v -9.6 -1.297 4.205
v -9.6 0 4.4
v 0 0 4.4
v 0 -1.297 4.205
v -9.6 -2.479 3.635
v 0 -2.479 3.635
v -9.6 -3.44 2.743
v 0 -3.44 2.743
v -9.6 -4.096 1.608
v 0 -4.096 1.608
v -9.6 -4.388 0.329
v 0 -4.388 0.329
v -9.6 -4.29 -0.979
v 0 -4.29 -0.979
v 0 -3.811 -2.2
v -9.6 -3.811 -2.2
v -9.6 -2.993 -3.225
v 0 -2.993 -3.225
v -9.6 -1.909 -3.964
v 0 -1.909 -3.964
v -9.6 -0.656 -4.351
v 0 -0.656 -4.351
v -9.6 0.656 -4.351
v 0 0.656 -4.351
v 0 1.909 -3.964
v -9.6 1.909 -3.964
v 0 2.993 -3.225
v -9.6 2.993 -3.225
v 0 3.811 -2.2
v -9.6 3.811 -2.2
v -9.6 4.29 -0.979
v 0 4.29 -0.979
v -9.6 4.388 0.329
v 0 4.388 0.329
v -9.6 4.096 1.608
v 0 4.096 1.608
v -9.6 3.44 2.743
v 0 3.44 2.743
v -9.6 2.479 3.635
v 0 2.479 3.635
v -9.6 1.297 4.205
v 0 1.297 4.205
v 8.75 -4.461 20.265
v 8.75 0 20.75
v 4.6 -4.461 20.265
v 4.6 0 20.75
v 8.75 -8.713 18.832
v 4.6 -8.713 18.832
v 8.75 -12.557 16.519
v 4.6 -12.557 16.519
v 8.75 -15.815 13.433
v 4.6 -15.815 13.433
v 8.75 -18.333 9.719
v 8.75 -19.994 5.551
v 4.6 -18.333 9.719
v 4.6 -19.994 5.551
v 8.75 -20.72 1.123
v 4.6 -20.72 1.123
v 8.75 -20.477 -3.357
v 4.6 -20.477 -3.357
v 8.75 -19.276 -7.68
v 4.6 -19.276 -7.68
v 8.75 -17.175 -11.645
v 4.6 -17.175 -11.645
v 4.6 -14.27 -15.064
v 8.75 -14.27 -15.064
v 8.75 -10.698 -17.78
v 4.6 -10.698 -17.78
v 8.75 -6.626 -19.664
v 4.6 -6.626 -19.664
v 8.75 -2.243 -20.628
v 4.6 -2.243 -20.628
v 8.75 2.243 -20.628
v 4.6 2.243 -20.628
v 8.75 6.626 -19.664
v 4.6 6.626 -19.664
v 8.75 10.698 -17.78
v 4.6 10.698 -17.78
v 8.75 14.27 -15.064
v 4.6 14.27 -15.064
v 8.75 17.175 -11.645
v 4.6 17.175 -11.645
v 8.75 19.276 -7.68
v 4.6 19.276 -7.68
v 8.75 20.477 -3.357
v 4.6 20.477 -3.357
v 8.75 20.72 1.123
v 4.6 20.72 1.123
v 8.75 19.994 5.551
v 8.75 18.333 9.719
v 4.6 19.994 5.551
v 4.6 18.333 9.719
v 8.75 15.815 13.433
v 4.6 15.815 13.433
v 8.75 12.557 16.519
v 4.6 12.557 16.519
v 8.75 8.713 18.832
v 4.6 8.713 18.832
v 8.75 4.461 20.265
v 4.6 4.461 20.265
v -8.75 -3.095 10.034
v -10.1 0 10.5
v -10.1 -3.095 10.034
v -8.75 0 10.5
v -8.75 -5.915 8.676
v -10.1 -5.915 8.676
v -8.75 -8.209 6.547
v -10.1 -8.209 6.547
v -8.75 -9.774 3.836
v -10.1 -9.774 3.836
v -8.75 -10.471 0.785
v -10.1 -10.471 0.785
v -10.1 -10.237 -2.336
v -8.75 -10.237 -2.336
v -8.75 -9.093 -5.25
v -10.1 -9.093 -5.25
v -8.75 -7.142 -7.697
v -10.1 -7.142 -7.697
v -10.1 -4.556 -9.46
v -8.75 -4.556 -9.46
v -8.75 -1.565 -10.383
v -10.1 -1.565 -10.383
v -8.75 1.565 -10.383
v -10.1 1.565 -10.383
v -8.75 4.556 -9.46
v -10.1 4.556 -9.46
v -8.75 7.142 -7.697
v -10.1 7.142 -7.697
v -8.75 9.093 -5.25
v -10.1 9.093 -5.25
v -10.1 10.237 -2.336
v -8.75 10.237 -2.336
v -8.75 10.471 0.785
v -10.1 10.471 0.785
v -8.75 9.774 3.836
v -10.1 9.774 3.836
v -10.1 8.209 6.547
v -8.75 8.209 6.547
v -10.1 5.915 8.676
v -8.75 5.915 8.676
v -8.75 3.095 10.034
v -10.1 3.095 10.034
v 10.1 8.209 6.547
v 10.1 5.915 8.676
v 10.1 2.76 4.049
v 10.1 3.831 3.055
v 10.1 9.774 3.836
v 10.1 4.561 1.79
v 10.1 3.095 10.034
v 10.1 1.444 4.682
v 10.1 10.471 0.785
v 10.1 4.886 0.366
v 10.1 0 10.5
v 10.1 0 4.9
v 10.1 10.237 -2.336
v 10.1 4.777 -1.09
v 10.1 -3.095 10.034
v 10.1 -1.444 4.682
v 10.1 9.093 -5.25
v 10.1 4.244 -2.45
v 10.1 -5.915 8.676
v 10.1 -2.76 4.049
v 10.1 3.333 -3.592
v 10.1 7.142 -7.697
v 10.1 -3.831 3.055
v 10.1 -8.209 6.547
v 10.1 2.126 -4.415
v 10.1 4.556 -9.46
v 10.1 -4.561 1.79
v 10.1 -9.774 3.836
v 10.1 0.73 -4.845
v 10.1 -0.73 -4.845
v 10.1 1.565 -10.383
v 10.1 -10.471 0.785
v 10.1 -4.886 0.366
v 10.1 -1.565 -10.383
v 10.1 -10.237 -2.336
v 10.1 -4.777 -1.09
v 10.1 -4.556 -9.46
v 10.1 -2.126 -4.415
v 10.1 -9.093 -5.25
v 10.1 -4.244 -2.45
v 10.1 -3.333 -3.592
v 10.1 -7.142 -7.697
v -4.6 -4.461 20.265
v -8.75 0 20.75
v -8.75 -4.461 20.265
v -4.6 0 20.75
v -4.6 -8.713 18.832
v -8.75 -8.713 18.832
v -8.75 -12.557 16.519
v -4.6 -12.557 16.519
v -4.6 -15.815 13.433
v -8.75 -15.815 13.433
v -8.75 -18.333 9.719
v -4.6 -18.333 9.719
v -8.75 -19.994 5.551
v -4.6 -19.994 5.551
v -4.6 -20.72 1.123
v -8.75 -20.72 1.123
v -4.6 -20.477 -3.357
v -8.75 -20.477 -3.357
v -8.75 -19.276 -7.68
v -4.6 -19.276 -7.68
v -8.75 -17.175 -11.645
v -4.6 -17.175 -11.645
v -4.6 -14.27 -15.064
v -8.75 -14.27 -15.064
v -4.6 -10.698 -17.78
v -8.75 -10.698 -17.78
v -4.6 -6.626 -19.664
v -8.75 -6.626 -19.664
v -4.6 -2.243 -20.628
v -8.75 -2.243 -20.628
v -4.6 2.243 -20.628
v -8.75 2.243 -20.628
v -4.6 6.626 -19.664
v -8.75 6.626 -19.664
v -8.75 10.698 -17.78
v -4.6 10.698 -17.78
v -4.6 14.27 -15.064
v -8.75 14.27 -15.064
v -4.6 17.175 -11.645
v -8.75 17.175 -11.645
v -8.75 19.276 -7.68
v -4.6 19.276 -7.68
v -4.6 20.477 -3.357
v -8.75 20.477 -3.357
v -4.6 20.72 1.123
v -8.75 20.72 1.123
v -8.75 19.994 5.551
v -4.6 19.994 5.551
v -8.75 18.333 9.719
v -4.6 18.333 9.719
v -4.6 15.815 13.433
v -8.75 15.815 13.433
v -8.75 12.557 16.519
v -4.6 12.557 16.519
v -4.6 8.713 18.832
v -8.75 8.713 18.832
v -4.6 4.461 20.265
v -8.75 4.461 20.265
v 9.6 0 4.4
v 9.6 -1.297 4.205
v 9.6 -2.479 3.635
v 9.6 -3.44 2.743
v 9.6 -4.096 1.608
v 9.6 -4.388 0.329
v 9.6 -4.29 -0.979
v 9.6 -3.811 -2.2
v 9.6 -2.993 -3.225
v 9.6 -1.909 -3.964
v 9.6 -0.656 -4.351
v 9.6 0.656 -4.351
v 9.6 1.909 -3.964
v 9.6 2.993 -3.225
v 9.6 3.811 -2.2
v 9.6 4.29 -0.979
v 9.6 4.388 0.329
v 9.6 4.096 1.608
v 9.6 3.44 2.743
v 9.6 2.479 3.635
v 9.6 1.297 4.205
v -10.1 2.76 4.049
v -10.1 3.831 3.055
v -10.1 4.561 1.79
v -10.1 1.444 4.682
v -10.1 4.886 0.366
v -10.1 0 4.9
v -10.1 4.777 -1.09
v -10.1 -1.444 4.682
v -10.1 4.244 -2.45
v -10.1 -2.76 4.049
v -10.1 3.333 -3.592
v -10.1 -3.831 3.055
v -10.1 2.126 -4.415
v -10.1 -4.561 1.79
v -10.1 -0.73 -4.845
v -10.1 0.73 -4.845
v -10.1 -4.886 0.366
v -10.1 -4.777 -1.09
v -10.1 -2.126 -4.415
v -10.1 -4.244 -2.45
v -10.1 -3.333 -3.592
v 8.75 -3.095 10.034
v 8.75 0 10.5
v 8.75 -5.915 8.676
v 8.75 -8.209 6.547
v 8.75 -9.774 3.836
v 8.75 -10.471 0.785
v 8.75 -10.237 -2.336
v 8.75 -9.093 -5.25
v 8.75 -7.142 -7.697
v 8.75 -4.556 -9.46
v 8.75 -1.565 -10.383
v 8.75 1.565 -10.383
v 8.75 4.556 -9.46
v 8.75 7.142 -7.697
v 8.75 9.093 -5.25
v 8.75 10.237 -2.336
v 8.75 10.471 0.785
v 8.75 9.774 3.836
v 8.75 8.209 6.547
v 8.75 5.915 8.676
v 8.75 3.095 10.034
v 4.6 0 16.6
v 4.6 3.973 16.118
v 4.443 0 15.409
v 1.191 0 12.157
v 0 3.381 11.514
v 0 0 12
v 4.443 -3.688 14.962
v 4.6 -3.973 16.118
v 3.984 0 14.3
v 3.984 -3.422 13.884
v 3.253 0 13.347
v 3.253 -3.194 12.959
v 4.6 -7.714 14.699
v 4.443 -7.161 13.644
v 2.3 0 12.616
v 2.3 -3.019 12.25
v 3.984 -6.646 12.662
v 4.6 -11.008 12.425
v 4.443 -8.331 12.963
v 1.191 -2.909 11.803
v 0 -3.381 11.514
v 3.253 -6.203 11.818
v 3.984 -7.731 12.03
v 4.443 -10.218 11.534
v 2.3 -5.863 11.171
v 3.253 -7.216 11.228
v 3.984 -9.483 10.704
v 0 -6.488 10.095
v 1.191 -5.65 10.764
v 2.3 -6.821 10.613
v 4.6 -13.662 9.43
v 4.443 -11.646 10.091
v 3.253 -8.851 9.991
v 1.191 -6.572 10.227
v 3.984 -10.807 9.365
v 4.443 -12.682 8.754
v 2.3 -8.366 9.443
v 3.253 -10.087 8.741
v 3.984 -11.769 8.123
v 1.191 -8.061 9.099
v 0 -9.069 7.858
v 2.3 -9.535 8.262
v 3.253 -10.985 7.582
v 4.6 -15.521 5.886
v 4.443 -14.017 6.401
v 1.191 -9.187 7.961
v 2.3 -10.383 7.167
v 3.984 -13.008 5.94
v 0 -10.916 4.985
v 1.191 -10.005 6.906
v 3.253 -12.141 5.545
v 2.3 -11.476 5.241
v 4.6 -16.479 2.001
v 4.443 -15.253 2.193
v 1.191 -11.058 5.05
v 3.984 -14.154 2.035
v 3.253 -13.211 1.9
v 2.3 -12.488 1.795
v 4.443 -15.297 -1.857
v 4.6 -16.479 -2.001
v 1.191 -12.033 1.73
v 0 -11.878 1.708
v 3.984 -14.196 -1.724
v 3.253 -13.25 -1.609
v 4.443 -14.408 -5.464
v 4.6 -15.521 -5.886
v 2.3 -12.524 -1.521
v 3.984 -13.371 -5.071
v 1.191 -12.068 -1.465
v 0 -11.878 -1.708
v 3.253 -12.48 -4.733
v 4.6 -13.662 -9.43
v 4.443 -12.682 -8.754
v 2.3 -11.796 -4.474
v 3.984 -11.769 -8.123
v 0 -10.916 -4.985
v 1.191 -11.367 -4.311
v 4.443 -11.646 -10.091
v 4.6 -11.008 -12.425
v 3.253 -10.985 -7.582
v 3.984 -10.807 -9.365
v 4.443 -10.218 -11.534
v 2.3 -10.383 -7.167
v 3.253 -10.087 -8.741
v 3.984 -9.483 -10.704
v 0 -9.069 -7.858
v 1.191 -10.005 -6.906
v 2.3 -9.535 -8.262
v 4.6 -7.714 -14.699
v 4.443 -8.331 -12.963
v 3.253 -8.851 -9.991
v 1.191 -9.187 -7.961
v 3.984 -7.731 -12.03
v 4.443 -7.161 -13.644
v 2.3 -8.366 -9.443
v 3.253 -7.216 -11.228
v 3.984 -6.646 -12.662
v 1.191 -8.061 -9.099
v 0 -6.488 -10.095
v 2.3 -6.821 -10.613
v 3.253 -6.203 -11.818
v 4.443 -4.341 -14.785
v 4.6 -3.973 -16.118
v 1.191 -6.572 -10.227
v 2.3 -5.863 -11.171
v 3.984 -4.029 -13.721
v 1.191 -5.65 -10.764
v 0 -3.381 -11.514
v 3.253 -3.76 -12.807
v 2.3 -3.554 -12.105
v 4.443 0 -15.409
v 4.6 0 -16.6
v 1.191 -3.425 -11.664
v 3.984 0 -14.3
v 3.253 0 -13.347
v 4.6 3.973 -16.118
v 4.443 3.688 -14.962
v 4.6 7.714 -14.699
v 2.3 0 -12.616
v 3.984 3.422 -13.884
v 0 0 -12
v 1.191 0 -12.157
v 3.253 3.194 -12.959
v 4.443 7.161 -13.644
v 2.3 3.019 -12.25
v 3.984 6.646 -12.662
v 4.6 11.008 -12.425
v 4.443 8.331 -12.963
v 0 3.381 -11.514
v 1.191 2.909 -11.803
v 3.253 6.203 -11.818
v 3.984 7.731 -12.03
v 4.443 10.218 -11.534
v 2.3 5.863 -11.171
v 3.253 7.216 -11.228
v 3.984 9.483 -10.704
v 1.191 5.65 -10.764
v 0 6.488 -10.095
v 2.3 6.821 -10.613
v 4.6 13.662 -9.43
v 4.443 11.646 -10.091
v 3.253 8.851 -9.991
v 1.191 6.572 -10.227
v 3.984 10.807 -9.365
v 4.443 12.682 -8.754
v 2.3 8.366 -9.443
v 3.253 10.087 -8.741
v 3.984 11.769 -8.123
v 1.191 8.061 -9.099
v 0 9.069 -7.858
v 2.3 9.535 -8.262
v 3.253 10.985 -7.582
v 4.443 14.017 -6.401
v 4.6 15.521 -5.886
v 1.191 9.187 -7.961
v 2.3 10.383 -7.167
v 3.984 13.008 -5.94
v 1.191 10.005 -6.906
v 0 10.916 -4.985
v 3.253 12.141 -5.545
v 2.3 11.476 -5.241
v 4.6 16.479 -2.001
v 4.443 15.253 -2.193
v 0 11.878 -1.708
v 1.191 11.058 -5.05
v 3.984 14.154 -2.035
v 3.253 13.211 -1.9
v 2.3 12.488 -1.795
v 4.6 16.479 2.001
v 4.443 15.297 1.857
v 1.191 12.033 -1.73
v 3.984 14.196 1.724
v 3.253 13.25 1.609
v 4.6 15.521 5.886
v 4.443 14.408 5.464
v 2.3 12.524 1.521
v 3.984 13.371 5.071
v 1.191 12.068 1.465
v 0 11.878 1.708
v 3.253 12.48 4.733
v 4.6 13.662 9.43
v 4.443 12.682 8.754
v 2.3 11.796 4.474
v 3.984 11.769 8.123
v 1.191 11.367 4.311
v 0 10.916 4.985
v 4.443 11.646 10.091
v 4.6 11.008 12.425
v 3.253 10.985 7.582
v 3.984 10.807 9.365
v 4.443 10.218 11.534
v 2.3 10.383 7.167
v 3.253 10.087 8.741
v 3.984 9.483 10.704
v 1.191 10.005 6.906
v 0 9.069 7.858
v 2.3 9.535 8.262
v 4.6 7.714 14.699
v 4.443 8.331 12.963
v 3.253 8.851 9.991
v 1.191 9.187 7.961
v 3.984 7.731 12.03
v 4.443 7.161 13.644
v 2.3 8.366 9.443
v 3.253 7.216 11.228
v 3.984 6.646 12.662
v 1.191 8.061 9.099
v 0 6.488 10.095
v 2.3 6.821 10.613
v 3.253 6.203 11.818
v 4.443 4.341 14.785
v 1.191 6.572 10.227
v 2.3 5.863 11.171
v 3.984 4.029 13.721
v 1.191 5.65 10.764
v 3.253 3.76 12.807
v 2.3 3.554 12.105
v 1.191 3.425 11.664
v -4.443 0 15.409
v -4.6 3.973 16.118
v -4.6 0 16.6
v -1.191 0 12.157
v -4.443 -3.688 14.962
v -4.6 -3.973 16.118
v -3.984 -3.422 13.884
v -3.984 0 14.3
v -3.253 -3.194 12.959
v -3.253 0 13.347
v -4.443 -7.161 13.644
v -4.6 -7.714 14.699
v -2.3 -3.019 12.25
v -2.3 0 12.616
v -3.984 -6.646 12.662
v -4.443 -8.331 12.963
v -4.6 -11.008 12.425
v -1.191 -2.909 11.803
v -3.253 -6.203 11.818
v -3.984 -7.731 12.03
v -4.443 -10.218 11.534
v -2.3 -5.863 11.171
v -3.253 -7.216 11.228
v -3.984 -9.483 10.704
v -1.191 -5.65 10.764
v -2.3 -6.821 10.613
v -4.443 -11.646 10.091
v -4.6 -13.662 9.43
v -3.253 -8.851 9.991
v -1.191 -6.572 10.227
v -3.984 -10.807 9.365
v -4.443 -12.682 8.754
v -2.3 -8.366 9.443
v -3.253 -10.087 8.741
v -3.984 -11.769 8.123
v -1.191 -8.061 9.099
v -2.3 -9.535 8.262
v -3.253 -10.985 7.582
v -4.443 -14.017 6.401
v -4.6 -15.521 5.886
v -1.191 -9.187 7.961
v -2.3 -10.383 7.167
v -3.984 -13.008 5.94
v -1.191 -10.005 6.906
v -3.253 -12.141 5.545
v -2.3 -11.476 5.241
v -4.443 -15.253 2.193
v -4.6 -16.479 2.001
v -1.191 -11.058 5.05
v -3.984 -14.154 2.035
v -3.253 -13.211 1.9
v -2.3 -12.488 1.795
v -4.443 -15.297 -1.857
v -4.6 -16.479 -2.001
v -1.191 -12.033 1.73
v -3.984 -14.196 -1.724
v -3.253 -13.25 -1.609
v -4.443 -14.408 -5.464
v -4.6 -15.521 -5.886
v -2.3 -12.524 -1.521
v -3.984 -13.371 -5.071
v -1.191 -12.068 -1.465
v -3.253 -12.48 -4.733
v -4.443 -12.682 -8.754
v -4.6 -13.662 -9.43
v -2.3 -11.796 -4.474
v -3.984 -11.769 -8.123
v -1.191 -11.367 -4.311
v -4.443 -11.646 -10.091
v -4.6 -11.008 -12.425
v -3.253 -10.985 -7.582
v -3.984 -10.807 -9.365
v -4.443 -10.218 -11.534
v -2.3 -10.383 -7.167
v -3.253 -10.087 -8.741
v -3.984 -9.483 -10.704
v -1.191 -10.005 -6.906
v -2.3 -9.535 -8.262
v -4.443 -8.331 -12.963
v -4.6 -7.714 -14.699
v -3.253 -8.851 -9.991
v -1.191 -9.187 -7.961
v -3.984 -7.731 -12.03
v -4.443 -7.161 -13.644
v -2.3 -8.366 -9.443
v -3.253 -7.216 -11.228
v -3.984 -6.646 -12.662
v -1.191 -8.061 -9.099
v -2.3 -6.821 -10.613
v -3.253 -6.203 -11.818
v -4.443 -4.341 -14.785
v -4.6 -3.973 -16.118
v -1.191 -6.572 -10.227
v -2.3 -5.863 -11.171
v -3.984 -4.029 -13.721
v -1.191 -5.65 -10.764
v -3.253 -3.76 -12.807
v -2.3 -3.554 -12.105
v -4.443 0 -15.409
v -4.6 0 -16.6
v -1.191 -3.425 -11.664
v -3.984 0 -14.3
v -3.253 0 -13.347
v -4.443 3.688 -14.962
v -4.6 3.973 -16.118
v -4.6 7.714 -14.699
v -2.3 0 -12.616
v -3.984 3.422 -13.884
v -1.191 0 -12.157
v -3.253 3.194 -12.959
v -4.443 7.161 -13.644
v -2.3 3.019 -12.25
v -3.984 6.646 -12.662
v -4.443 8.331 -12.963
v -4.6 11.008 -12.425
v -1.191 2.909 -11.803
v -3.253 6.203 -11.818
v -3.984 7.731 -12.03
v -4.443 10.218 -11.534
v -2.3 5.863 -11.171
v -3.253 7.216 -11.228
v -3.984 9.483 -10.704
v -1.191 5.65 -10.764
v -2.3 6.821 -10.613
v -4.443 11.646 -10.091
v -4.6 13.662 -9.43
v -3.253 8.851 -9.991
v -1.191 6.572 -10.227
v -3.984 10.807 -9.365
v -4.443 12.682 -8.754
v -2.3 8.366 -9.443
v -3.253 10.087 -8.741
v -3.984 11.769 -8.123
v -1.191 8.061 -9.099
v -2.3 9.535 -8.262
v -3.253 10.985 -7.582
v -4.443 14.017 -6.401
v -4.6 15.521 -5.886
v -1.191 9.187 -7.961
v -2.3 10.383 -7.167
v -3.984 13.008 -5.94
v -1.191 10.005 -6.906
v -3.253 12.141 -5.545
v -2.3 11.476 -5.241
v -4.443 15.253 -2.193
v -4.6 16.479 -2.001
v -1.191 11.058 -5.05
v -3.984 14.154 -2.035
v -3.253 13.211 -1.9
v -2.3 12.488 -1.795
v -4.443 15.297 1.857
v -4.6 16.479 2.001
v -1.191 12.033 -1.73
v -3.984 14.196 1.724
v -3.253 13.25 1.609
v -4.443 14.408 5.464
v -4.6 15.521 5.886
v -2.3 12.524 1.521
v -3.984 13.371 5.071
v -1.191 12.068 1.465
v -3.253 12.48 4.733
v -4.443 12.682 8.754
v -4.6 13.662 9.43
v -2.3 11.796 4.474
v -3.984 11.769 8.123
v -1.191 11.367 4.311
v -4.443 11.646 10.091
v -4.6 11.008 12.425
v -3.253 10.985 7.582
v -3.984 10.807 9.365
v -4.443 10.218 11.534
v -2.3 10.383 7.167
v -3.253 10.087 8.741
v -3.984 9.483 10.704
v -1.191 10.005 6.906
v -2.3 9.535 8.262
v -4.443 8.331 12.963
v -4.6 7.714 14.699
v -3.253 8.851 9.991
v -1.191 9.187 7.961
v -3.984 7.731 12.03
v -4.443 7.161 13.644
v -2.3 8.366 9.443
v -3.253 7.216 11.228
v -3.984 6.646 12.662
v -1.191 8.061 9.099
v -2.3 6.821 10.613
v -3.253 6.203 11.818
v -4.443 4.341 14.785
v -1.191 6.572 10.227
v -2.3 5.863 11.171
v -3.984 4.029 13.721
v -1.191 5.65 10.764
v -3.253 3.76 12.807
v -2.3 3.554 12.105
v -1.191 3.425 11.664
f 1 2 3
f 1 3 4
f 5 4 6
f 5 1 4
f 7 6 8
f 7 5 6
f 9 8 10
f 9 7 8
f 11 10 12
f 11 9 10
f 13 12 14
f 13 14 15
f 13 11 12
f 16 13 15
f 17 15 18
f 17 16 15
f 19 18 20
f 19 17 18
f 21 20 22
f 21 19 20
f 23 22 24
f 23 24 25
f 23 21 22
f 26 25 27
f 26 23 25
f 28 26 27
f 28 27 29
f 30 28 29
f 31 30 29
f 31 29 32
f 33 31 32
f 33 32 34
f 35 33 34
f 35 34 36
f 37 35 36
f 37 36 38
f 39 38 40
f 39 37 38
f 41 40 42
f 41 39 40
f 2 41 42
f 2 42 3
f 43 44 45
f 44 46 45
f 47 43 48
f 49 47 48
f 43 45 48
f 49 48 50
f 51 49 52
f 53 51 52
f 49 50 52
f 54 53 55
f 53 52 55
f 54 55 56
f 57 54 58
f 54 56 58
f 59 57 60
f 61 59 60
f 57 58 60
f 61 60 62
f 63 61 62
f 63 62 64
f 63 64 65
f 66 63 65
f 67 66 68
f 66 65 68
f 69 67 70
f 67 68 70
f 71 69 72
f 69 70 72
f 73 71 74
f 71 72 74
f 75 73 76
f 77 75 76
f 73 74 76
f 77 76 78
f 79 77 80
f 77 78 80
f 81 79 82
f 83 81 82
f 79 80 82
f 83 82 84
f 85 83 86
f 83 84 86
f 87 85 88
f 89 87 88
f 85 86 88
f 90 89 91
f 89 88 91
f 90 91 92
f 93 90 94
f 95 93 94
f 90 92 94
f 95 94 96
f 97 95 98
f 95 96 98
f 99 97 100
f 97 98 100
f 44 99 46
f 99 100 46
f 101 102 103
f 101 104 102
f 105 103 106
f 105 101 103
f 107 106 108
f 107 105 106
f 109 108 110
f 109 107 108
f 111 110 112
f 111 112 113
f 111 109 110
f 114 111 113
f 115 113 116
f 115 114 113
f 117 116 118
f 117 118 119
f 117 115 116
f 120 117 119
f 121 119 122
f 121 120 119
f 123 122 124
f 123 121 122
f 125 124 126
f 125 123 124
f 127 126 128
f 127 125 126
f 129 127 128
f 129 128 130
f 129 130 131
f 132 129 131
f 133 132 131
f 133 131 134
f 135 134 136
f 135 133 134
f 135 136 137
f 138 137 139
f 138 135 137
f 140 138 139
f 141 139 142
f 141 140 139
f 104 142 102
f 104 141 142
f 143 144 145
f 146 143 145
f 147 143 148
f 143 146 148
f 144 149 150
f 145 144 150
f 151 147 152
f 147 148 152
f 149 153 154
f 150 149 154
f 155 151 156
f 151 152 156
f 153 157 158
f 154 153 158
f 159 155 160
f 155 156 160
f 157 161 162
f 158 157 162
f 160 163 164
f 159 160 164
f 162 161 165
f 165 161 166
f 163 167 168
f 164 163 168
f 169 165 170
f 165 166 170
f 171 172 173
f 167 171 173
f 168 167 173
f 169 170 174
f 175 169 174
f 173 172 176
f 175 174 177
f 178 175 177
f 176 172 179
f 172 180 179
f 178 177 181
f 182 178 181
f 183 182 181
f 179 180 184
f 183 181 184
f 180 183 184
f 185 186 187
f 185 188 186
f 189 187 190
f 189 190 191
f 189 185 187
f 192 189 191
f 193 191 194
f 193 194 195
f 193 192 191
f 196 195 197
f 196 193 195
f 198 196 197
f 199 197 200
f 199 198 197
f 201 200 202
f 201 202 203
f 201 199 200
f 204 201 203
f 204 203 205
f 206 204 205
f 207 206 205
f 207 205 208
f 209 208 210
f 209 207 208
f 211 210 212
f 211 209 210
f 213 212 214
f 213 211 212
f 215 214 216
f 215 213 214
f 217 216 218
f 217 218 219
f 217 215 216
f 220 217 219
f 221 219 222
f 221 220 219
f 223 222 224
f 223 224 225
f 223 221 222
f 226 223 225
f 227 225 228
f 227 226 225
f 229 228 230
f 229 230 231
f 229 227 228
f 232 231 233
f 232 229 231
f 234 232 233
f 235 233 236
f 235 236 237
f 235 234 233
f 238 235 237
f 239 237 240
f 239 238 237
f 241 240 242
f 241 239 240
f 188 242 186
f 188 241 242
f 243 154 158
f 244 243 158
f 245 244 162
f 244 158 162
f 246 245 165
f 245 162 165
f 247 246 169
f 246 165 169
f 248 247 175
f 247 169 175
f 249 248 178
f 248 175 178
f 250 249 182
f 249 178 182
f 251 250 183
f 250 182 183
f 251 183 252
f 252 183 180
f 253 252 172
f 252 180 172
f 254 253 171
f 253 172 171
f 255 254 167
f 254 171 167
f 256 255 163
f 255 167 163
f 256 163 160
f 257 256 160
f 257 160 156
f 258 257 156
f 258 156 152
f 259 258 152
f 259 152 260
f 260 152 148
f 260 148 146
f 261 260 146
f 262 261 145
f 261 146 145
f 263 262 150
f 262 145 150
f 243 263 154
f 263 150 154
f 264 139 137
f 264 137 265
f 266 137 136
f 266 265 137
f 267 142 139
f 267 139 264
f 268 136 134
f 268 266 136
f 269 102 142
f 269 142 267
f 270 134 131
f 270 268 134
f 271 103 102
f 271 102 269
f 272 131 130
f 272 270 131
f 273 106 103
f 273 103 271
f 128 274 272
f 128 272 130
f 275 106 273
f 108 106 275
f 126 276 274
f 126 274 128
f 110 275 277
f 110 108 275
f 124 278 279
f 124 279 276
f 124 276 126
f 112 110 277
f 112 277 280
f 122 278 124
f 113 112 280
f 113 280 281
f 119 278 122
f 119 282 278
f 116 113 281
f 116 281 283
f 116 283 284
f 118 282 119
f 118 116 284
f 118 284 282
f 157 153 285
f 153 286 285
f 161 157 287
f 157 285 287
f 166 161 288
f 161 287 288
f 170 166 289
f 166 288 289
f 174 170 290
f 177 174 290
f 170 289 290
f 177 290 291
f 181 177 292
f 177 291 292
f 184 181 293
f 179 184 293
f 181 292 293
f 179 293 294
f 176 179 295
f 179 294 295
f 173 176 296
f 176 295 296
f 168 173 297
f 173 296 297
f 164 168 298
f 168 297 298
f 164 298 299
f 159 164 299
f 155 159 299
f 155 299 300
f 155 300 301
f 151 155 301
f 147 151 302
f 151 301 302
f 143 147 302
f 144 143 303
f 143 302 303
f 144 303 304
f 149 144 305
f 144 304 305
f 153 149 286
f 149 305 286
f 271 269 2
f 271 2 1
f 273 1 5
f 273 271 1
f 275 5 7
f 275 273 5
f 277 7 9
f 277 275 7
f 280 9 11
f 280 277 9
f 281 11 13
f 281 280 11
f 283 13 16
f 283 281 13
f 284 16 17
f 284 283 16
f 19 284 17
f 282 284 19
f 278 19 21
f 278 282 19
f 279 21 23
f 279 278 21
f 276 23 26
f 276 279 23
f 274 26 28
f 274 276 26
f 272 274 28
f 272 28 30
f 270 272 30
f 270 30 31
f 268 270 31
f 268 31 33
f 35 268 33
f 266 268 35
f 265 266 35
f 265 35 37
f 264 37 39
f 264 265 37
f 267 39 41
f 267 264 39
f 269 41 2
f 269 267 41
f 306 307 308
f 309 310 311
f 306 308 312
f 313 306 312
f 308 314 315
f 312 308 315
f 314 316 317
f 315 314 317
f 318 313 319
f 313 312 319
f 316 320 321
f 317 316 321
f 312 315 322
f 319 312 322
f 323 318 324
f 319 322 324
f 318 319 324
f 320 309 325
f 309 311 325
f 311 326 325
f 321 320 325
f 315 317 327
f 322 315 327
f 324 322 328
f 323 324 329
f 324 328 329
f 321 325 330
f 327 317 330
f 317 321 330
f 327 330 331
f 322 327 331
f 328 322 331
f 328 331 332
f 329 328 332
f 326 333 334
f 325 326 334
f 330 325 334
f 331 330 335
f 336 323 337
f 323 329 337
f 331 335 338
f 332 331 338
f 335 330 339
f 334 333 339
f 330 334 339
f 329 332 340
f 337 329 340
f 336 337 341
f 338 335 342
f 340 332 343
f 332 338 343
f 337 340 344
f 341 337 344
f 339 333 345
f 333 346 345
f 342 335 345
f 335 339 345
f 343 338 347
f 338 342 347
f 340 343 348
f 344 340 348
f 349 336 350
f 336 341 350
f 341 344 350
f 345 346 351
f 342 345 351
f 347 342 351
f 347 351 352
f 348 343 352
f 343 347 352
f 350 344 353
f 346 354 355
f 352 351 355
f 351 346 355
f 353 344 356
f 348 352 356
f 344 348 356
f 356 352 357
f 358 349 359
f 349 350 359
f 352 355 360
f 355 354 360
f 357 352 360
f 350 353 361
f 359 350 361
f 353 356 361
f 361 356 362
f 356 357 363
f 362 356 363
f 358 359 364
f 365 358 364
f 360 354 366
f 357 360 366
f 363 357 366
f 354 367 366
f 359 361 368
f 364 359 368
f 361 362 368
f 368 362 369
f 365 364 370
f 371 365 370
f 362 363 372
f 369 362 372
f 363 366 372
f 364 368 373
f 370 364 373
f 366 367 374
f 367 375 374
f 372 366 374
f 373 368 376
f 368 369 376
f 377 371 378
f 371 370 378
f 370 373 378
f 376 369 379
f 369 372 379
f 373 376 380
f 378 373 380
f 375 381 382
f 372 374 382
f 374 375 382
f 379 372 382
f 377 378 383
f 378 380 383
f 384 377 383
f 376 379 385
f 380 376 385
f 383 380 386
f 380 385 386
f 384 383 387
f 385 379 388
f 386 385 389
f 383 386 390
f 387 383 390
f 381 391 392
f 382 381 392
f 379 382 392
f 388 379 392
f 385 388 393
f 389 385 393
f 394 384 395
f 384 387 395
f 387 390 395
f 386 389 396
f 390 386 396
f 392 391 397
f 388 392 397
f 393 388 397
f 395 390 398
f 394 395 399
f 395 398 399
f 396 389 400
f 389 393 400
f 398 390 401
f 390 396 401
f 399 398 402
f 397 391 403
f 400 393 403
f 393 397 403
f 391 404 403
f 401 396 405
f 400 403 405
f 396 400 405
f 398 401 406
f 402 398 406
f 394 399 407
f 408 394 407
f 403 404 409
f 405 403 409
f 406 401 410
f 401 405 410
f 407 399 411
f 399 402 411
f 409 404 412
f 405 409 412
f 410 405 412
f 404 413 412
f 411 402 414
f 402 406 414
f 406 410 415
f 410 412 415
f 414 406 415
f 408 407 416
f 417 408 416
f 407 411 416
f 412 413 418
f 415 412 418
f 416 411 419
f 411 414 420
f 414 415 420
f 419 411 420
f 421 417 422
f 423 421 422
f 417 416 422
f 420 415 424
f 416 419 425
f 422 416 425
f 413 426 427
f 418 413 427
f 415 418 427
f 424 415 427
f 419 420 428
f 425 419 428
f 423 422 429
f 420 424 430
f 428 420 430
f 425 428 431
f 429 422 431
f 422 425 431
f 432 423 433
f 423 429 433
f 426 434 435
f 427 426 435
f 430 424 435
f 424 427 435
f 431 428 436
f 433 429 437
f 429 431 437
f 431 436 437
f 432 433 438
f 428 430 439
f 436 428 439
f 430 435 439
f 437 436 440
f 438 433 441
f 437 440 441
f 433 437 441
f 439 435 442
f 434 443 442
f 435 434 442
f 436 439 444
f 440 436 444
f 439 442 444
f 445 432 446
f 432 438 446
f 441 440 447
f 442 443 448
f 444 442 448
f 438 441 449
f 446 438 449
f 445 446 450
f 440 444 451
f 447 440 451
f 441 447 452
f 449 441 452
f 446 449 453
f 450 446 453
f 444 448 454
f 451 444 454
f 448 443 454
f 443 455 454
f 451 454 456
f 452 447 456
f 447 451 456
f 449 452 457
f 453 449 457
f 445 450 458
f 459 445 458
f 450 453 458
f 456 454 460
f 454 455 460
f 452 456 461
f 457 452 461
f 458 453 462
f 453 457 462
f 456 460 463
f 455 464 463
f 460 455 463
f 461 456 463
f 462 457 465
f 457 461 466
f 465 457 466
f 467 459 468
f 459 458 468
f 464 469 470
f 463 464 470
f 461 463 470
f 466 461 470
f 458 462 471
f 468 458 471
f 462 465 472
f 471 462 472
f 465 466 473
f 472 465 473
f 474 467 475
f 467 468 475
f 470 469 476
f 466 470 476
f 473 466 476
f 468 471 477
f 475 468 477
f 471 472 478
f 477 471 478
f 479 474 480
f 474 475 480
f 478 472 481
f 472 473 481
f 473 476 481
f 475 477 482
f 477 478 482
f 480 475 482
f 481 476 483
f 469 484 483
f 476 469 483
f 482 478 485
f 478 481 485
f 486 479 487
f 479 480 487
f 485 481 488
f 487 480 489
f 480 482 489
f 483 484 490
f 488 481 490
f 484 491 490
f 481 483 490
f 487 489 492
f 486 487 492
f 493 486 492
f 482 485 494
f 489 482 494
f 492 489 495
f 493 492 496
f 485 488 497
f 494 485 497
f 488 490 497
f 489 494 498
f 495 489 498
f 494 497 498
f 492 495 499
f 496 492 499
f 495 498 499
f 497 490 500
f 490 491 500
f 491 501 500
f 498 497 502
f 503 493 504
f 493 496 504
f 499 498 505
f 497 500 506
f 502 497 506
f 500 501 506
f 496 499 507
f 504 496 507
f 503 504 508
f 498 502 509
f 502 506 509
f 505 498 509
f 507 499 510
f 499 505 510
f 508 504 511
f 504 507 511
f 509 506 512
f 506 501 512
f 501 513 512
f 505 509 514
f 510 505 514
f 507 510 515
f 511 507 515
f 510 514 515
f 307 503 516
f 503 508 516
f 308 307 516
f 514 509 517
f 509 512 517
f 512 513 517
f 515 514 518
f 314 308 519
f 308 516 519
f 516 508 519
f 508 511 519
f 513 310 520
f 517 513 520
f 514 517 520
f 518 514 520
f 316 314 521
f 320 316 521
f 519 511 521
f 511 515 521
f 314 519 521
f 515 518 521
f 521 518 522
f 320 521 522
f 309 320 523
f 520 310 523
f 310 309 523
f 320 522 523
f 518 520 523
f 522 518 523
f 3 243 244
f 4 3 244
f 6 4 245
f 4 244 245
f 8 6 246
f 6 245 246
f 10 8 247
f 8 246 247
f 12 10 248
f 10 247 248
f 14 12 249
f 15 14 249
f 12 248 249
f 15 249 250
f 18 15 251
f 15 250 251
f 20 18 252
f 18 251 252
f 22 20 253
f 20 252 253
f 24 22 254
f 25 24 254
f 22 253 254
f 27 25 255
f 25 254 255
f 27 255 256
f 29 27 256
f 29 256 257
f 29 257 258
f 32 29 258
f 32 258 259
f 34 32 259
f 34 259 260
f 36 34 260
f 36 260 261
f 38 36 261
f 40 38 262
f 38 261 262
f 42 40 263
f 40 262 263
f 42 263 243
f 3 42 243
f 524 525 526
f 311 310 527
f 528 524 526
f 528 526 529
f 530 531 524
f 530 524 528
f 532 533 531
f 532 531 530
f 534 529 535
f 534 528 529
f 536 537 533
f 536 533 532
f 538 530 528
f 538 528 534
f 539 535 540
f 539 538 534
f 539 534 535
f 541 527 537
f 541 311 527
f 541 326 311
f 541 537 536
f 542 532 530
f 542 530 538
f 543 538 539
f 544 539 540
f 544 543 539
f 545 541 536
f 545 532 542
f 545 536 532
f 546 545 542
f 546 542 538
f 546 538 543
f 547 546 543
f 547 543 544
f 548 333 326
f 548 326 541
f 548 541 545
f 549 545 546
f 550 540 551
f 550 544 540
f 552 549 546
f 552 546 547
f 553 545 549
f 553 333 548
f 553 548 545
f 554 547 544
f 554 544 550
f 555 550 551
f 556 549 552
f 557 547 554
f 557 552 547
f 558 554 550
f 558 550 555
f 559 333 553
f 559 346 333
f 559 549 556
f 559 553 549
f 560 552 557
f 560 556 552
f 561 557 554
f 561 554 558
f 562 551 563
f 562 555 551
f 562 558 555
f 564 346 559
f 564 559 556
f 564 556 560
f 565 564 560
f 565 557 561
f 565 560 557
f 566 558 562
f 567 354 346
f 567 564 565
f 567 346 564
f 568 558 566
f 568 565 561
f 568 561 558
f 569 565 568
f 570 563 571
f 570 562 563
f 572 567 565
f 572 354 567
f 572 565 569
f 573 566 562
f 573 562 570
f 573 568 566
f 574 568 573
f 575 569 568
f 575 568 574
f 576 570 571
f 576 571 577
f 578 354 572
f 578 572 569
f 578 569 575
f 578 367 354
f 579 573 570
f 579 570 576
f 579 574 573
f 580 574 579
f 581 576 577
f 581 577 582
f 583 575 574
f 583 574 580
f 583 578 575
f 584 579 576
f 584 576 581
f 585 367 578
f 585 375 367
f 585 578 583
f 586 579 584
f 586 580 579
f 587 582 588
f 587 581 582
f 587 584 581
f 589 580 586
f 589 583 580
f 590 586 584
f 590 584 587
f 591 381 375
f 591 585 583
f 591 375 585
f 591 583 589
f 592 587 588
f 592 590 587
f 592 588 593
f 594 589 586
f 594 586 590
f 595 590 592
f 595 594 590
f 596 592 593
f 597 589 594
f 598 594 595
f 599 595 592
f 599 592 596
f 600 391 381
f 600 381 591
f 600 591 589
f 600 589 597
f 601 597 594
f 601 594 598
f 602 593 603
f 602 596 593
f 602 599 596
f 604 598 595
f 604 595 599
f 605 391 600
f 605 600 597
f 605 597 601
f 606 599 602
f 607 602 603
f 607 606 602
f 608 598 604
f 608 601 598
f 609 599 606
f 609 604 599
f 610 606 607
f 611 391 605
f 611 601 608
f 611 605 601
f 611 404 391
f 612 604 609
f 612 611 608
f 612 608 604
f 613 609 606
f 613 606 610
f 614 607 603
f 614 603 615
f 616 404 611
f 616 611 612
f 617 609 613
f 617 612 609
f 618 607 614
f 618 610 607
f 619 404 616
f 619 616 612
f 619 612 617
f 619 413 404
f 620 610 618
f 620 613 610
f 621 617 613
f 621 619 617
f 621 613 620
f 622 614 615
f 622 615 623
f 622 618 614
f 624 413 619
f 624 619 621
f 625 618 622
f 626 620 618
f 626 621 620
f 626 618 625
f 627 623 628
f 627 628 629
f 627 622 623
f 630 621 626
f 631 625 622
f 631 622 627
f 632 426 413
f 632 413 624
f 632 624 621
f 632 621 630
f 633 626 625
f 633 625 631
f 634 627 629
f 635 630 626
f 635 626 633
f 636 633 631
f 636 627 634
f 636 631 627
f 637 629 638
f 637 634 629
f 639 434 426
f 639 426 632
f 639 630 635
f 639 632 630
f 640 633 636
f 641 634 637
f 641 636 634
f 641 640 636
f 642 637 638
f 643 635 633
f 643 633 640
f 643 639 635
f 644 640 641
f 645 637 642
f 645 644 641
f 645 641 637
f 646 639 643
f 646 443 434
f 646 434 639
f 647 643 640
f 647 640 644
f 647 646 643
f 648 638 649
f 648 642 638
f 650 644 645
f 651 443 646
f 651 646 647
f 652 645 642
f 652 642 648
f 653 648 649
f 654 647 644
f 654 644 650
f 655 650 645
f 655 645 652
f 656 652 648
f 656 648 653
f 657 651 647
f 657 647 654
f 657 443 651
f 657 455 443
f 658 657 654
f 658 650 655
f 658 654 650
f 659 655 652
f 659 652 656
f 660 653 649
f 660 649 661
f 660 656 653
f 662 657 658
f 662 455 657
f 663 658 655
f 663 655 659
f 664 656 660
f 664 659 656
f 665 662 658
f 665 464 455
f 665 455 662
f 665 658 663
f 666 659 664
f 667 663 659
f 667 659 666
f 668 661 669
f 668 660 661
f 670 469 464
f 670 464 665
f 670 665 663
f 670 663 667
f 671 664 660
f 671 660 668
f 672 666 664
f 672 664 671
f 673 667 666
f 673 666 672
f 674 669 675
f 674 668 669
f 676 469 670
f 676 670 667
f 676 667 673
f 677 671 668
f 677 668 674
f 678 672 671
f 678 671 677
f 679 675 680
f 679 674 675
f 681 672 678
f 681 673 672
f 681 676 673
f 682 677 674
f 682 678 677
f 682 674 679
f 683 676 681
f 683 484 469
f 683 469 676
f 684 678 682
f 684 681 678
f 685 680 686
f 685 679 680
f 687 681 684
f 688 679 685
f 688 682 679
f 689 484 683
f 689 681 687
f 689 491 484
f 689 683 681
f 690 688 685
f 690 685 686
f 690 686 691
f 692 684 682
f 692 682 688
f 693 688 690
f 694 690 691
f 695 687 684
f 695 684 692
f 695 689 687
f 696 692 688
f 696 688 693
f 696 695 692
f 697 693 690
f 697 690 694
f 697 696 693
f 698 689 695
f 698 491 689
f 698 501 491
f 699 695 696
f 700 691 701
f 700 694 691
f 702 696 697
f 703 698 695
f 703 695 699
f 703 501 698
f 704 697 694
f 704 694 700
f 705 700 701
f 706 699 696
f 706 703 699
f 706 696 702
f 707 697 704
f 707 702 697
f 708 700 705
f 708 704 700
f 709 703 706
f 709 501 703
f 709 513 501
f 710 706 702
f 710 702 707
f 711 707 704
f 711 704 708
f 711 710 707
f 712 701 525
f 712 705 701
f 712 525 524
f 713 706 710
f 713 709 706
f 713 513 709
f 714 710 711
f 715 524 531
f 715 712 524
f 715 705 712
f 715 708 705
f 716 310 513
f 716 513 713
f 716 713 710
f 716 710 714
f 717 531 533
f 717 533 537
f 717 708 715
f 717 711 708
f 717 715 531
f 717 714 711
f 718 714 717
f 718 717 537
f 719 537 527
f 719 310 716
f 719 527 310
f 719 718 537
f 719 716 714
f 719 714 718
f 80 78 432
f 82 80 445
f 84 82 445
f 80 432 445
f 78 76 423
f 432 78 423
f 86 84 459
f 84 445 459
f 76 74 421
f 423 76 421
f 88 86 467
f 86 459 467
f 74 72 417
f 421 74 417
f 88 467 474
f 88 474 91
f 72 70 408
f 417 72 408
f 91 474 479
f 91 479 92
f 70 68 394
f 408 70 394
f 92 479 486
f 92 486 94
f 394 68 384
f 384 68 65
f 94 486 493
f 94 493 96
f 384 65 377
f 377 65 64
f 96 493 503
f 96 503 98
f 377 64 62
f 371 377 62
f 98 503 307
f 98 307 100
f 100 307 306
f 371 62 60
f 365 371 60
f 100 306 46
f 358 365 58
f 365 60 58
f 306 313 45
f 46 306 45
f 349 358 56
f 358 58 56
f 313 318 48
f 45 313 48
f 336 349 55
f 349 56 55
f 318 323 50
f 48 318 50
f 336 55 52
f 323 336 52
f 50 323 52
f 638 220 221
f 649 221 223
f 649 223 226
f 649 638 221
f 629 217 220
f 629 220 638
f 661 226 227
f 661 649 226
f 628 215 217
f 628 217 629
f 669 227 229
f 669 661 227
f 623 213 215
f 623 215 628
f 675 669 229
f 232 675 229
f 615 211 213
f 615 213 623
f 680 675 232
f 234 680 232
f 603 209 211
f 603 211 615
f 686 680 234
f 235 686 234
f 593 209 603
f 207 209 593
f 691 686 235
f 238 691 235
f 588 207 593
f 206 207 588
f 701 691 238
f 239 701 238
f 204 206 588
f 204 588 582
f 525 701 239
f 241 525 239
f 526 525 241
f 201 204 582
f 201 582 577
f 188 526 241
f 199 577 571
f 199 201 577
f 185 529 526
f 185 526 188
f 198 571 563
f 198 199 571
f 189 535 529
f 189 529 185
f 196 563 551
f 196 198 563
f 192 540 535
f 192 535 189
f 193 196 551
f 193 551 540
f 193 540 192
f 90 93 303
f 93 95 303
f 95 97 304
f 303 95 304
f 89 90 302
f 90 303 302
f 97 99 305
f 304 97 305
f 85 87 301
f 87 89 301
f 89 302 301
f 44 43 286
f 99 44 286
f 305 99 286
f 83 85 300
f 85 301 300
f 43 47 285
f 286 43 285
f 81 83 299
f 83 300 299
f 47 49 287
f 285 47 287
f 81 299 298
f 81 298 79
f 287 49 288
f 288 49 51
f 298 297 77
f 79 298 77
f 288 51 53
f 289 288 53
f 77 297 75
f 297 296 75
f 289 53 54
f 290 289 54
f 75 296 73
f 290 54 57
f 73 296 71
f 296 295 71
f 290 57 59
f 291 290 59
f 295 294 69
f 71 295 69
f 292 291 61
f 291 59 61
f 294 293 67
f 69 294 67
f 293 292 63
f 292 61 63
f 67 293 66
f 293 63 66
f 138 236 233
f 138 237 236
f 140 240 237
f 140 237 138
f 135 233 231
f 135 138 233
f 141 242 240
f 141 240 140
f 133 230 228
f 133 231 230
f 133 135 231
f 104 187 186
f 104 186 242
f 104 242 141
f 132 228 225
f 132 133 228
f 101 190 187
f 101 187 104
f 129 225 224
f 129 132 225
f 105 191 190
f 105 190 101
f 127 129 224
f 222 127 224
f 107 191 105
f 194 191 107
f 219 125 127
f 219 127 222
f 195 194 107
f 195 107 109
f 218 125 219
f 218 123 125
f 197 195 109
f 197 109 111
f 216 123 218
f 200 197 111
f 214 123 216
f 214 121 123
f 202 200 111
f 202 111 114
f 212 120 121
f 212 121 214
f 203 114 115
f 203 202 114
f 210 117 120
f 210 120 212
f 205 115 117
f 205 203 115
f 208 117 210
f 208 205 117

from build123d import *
from build123d import SkipClean  # not in build123d's __all__

# Parameters (mm, degrees)
F3_SIZE = 0.5


with BuildPart() as f1:
    # F0 (on Front) → F1 (revolve)
    with BuildSketch(Plane.XZ):
        with BuildLine():
            Line((0, 4.4), (10.1, 4.4))
            Line((10.1, 4.4), (10.1, 10.5))
            Line((10.1, 10.5), (8.75, 10.5))
            Line((8.75, 10.5), (8.75, 20.75))
            Line((8.75, 20.75), (4.6, 20.75))
            Line((4.6, 20.75), (4.6, 16.6))
            ThreePointArc((4.6, 16.6), (3.2526911935, 13.3473088065), (0, 12))
            Line((0, 12), (0, 4.4))
        make_face()
    revolve(axis=Axis((5.05, 0, 0), (1, 0, 0)))

    # F2: F1 across plane


with BuildPart() as f1_1:
    add(f1.part, clean=False)
    with SkipClean():  # cleaning this boolean's faces spoils the solid; the shape is the same uncleaned
        add(f1.part.mirror(Plane.YZ), clean=False)

    # F3
    f3_edges = [f1_1.edges().sort_by_distance(p)[0] for p in [
        (10.1, 0, -4.4),
        (-10.1, 0, -4.4),
    ]]
    chamfer(f3_edges, length=F3_SIZE)


solid = f1_1.part
